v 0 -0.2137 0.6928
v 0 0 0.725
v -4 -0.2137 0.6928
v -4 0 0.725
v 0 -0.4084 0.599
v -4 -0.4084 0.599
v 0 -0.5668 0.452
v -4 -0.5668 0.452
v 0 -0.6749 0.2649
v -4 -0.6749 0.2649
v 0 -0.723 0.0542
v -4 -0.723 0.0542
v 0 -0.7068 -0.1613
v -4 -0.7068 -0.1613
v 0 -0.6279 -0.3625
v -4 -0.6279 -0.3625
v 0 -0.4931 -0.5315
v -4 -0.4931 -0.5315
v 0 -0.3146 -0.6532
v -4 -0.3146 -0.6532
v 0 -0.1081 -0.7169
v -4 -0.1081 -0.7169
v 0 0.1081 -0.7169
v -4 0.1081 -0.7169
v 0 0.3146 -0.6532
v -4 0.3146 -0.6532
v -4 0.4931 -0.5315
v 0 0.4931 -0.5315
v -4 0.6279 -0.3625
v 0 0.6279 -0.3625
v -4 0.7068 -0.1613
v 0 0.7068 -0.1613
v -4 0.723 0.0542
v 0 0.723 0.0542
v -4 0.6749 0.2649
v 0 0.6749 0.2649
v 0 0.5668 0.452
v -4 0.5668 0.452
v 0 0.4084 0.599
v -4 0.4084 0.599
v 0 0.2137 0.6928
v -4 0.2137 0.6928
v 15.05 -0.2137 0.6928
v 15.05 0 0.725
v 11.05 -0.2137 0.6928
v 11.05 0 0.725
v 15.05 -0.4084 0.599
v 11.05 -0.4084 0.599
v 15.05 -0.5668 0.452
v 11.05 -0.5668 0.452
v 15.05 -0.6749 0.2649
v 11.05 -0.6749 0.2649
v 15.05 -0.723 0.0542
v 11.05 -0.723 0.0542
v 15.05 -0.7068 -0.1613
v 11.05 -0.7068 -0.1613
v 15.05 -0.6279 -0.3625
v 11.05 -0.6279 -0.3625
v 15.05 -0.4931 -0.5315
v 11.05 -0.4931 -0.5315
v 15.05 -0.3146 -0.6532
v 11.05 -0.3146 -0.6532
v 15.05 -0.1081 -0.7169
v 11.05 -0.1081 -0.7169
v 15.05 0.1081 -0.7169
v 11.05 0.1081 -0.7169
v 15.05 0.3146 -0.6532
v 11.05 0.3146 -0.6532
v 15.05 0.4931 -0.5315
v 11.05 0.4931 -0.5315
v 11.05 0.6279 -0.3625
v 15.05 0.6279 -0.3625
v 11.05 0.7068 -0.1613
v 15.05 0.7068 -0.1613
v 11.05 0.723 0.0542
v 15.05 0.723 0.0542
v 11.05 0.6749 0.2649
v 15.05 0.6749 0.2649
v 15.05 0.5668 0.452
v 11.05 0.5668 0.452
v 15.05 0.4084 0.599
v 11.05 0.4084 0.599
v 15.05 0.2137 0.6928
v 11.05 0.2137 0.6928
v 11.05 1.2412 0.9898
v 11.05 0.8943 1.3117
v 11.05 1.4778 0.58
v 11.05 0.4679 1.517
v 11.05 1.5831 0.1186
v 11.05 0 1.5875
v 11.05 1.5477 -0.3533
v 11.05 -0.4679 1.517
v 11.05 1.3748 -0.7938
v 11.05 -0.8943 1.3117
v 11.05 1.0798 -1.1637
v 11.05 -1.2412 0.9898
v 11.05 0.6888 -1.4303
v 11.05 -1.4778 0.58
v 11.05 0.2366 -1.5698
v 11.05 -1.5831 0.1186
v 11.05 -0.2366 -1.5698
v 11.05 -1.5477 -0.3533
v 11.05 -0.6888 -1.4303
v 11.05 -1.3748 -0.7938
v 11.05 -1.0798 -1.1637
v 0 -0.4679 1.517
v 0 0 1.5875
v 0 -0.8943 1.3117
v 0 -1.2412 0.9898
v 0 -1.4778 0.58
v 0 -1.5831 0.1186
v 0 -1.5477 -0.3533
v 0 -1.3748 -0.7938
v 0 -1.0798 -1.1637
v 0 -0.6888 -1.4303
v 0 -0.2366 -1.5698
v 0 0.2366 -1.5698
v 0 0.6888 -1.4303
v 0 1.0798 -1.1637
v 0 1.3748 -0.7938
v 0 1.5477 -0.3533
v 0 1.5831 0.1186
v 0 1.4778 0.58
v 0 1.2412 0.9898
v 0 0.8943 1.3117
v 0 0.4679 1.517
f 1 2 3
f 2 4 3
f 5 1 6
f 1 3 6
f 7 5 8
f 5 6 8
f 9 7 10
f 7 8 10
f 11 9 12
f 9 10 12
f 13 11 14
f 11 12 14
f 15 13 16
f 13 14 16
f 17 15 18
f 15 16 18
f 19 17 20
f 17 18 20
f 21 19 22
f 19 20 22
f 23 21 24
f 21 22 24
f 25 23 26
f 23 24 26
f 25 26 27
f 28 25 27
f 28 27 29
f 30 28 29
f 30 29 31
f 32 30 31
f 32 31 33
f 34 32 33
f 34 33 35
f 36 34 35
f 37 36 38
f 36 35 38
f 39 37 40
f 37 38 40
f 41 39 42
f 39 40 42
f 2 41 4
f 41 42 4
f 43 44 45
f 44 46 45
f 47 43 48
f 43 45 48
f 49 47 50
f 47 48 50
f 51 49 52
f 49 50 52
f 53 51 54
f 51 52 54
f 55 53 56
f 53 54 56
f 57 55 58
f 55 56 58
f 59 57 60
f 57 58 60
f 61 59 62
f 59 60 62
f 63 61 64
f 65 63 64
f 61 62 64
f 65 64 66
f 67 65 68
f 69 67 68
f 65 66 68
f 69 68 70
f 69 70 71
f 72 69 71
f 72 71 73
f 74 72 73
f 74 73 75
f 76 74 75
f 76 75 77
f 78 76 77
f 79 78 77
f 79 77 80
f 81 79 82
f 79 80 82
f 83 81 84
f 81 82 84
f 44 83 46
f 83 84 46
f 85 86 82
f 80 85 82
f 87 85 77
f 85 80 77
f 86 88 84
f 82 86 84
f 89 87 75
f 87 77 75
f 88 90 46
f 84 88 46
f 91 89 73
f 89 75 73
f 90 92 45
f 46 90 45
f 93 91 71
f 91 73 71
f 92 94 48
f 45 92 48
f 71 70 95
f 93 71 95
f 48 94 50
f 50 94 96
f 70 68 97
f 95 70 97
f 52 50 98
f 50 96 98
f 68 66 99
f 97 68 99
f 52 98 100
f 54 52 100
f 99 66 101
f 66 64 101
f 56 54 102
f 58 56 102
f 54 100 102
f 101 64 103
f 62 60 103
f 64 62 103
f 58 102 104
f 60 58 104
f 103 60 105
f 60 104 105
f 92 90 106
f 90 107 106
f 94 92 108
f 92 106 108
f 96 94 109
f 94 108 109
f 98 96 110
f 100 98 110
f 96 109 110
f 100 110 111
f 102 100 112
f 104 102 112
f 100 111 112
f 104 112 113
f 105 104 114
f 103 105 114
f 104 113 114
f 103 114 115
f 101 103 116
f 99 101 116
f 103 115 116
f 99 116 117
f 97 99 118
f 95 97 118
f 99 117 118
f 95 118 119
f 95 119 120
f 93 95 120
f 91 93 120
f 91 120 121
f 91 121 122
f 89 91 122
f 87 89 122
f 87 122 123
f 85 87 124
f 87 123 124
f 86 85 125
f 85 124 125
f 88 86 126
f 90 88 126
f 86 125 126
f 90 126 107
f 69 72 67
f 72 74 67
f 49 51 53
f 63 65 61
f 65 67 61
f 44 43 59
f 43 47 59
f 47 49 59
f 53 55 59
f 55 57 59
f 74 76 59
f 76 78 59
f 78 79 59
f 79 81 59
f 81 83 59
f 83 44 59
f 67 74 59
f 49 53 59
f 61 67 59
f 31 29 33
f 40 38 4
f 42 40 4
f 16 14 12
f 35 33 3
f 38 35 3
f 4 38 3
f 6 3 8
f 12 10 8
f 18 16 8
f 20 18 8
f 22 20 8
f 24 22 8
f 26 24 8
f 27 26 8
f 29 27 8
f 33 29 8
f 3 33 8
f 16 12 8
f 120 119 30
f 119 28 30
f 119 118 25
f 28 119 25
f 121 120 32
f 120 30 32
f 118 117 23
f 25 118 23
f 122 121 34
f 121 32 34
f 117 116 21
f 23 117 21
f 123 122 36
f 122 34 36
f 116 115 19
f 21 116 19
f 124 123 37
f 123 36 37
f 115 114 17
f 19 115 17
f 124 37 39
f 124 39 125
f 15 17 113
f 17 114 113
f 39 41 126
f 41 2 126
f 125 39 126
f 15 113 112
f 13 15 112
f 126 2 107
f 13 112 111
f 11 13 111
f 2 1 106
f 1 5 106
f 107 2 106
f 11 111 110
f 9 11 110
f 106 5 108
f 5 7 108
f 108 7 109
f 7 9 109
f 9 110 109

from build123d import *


with BuildPart() as part:
    # Sketch1 → Revolve1 (revolve)
    with BuildSketch(Plane.XY, mode=Mode.PRIVATE) as revolve1_sk:
        Polygon((0, 1.5875), (0, 0.725), (-4, 0.725), (-4, 0), (15.05, 0), (15.05, 0.725), (11.05, 0.725), (11.05, 1.5875), align=None)
    revolve(revolve1_sk.sketch.rotate(Axis((-19.47872402, 0, 0), (1, 0, 0)), 90), axis=Axis((-19.47872402, 0, 0), (1, 0, 0)))  # turned: the seam where the file's is


solid = part.part
